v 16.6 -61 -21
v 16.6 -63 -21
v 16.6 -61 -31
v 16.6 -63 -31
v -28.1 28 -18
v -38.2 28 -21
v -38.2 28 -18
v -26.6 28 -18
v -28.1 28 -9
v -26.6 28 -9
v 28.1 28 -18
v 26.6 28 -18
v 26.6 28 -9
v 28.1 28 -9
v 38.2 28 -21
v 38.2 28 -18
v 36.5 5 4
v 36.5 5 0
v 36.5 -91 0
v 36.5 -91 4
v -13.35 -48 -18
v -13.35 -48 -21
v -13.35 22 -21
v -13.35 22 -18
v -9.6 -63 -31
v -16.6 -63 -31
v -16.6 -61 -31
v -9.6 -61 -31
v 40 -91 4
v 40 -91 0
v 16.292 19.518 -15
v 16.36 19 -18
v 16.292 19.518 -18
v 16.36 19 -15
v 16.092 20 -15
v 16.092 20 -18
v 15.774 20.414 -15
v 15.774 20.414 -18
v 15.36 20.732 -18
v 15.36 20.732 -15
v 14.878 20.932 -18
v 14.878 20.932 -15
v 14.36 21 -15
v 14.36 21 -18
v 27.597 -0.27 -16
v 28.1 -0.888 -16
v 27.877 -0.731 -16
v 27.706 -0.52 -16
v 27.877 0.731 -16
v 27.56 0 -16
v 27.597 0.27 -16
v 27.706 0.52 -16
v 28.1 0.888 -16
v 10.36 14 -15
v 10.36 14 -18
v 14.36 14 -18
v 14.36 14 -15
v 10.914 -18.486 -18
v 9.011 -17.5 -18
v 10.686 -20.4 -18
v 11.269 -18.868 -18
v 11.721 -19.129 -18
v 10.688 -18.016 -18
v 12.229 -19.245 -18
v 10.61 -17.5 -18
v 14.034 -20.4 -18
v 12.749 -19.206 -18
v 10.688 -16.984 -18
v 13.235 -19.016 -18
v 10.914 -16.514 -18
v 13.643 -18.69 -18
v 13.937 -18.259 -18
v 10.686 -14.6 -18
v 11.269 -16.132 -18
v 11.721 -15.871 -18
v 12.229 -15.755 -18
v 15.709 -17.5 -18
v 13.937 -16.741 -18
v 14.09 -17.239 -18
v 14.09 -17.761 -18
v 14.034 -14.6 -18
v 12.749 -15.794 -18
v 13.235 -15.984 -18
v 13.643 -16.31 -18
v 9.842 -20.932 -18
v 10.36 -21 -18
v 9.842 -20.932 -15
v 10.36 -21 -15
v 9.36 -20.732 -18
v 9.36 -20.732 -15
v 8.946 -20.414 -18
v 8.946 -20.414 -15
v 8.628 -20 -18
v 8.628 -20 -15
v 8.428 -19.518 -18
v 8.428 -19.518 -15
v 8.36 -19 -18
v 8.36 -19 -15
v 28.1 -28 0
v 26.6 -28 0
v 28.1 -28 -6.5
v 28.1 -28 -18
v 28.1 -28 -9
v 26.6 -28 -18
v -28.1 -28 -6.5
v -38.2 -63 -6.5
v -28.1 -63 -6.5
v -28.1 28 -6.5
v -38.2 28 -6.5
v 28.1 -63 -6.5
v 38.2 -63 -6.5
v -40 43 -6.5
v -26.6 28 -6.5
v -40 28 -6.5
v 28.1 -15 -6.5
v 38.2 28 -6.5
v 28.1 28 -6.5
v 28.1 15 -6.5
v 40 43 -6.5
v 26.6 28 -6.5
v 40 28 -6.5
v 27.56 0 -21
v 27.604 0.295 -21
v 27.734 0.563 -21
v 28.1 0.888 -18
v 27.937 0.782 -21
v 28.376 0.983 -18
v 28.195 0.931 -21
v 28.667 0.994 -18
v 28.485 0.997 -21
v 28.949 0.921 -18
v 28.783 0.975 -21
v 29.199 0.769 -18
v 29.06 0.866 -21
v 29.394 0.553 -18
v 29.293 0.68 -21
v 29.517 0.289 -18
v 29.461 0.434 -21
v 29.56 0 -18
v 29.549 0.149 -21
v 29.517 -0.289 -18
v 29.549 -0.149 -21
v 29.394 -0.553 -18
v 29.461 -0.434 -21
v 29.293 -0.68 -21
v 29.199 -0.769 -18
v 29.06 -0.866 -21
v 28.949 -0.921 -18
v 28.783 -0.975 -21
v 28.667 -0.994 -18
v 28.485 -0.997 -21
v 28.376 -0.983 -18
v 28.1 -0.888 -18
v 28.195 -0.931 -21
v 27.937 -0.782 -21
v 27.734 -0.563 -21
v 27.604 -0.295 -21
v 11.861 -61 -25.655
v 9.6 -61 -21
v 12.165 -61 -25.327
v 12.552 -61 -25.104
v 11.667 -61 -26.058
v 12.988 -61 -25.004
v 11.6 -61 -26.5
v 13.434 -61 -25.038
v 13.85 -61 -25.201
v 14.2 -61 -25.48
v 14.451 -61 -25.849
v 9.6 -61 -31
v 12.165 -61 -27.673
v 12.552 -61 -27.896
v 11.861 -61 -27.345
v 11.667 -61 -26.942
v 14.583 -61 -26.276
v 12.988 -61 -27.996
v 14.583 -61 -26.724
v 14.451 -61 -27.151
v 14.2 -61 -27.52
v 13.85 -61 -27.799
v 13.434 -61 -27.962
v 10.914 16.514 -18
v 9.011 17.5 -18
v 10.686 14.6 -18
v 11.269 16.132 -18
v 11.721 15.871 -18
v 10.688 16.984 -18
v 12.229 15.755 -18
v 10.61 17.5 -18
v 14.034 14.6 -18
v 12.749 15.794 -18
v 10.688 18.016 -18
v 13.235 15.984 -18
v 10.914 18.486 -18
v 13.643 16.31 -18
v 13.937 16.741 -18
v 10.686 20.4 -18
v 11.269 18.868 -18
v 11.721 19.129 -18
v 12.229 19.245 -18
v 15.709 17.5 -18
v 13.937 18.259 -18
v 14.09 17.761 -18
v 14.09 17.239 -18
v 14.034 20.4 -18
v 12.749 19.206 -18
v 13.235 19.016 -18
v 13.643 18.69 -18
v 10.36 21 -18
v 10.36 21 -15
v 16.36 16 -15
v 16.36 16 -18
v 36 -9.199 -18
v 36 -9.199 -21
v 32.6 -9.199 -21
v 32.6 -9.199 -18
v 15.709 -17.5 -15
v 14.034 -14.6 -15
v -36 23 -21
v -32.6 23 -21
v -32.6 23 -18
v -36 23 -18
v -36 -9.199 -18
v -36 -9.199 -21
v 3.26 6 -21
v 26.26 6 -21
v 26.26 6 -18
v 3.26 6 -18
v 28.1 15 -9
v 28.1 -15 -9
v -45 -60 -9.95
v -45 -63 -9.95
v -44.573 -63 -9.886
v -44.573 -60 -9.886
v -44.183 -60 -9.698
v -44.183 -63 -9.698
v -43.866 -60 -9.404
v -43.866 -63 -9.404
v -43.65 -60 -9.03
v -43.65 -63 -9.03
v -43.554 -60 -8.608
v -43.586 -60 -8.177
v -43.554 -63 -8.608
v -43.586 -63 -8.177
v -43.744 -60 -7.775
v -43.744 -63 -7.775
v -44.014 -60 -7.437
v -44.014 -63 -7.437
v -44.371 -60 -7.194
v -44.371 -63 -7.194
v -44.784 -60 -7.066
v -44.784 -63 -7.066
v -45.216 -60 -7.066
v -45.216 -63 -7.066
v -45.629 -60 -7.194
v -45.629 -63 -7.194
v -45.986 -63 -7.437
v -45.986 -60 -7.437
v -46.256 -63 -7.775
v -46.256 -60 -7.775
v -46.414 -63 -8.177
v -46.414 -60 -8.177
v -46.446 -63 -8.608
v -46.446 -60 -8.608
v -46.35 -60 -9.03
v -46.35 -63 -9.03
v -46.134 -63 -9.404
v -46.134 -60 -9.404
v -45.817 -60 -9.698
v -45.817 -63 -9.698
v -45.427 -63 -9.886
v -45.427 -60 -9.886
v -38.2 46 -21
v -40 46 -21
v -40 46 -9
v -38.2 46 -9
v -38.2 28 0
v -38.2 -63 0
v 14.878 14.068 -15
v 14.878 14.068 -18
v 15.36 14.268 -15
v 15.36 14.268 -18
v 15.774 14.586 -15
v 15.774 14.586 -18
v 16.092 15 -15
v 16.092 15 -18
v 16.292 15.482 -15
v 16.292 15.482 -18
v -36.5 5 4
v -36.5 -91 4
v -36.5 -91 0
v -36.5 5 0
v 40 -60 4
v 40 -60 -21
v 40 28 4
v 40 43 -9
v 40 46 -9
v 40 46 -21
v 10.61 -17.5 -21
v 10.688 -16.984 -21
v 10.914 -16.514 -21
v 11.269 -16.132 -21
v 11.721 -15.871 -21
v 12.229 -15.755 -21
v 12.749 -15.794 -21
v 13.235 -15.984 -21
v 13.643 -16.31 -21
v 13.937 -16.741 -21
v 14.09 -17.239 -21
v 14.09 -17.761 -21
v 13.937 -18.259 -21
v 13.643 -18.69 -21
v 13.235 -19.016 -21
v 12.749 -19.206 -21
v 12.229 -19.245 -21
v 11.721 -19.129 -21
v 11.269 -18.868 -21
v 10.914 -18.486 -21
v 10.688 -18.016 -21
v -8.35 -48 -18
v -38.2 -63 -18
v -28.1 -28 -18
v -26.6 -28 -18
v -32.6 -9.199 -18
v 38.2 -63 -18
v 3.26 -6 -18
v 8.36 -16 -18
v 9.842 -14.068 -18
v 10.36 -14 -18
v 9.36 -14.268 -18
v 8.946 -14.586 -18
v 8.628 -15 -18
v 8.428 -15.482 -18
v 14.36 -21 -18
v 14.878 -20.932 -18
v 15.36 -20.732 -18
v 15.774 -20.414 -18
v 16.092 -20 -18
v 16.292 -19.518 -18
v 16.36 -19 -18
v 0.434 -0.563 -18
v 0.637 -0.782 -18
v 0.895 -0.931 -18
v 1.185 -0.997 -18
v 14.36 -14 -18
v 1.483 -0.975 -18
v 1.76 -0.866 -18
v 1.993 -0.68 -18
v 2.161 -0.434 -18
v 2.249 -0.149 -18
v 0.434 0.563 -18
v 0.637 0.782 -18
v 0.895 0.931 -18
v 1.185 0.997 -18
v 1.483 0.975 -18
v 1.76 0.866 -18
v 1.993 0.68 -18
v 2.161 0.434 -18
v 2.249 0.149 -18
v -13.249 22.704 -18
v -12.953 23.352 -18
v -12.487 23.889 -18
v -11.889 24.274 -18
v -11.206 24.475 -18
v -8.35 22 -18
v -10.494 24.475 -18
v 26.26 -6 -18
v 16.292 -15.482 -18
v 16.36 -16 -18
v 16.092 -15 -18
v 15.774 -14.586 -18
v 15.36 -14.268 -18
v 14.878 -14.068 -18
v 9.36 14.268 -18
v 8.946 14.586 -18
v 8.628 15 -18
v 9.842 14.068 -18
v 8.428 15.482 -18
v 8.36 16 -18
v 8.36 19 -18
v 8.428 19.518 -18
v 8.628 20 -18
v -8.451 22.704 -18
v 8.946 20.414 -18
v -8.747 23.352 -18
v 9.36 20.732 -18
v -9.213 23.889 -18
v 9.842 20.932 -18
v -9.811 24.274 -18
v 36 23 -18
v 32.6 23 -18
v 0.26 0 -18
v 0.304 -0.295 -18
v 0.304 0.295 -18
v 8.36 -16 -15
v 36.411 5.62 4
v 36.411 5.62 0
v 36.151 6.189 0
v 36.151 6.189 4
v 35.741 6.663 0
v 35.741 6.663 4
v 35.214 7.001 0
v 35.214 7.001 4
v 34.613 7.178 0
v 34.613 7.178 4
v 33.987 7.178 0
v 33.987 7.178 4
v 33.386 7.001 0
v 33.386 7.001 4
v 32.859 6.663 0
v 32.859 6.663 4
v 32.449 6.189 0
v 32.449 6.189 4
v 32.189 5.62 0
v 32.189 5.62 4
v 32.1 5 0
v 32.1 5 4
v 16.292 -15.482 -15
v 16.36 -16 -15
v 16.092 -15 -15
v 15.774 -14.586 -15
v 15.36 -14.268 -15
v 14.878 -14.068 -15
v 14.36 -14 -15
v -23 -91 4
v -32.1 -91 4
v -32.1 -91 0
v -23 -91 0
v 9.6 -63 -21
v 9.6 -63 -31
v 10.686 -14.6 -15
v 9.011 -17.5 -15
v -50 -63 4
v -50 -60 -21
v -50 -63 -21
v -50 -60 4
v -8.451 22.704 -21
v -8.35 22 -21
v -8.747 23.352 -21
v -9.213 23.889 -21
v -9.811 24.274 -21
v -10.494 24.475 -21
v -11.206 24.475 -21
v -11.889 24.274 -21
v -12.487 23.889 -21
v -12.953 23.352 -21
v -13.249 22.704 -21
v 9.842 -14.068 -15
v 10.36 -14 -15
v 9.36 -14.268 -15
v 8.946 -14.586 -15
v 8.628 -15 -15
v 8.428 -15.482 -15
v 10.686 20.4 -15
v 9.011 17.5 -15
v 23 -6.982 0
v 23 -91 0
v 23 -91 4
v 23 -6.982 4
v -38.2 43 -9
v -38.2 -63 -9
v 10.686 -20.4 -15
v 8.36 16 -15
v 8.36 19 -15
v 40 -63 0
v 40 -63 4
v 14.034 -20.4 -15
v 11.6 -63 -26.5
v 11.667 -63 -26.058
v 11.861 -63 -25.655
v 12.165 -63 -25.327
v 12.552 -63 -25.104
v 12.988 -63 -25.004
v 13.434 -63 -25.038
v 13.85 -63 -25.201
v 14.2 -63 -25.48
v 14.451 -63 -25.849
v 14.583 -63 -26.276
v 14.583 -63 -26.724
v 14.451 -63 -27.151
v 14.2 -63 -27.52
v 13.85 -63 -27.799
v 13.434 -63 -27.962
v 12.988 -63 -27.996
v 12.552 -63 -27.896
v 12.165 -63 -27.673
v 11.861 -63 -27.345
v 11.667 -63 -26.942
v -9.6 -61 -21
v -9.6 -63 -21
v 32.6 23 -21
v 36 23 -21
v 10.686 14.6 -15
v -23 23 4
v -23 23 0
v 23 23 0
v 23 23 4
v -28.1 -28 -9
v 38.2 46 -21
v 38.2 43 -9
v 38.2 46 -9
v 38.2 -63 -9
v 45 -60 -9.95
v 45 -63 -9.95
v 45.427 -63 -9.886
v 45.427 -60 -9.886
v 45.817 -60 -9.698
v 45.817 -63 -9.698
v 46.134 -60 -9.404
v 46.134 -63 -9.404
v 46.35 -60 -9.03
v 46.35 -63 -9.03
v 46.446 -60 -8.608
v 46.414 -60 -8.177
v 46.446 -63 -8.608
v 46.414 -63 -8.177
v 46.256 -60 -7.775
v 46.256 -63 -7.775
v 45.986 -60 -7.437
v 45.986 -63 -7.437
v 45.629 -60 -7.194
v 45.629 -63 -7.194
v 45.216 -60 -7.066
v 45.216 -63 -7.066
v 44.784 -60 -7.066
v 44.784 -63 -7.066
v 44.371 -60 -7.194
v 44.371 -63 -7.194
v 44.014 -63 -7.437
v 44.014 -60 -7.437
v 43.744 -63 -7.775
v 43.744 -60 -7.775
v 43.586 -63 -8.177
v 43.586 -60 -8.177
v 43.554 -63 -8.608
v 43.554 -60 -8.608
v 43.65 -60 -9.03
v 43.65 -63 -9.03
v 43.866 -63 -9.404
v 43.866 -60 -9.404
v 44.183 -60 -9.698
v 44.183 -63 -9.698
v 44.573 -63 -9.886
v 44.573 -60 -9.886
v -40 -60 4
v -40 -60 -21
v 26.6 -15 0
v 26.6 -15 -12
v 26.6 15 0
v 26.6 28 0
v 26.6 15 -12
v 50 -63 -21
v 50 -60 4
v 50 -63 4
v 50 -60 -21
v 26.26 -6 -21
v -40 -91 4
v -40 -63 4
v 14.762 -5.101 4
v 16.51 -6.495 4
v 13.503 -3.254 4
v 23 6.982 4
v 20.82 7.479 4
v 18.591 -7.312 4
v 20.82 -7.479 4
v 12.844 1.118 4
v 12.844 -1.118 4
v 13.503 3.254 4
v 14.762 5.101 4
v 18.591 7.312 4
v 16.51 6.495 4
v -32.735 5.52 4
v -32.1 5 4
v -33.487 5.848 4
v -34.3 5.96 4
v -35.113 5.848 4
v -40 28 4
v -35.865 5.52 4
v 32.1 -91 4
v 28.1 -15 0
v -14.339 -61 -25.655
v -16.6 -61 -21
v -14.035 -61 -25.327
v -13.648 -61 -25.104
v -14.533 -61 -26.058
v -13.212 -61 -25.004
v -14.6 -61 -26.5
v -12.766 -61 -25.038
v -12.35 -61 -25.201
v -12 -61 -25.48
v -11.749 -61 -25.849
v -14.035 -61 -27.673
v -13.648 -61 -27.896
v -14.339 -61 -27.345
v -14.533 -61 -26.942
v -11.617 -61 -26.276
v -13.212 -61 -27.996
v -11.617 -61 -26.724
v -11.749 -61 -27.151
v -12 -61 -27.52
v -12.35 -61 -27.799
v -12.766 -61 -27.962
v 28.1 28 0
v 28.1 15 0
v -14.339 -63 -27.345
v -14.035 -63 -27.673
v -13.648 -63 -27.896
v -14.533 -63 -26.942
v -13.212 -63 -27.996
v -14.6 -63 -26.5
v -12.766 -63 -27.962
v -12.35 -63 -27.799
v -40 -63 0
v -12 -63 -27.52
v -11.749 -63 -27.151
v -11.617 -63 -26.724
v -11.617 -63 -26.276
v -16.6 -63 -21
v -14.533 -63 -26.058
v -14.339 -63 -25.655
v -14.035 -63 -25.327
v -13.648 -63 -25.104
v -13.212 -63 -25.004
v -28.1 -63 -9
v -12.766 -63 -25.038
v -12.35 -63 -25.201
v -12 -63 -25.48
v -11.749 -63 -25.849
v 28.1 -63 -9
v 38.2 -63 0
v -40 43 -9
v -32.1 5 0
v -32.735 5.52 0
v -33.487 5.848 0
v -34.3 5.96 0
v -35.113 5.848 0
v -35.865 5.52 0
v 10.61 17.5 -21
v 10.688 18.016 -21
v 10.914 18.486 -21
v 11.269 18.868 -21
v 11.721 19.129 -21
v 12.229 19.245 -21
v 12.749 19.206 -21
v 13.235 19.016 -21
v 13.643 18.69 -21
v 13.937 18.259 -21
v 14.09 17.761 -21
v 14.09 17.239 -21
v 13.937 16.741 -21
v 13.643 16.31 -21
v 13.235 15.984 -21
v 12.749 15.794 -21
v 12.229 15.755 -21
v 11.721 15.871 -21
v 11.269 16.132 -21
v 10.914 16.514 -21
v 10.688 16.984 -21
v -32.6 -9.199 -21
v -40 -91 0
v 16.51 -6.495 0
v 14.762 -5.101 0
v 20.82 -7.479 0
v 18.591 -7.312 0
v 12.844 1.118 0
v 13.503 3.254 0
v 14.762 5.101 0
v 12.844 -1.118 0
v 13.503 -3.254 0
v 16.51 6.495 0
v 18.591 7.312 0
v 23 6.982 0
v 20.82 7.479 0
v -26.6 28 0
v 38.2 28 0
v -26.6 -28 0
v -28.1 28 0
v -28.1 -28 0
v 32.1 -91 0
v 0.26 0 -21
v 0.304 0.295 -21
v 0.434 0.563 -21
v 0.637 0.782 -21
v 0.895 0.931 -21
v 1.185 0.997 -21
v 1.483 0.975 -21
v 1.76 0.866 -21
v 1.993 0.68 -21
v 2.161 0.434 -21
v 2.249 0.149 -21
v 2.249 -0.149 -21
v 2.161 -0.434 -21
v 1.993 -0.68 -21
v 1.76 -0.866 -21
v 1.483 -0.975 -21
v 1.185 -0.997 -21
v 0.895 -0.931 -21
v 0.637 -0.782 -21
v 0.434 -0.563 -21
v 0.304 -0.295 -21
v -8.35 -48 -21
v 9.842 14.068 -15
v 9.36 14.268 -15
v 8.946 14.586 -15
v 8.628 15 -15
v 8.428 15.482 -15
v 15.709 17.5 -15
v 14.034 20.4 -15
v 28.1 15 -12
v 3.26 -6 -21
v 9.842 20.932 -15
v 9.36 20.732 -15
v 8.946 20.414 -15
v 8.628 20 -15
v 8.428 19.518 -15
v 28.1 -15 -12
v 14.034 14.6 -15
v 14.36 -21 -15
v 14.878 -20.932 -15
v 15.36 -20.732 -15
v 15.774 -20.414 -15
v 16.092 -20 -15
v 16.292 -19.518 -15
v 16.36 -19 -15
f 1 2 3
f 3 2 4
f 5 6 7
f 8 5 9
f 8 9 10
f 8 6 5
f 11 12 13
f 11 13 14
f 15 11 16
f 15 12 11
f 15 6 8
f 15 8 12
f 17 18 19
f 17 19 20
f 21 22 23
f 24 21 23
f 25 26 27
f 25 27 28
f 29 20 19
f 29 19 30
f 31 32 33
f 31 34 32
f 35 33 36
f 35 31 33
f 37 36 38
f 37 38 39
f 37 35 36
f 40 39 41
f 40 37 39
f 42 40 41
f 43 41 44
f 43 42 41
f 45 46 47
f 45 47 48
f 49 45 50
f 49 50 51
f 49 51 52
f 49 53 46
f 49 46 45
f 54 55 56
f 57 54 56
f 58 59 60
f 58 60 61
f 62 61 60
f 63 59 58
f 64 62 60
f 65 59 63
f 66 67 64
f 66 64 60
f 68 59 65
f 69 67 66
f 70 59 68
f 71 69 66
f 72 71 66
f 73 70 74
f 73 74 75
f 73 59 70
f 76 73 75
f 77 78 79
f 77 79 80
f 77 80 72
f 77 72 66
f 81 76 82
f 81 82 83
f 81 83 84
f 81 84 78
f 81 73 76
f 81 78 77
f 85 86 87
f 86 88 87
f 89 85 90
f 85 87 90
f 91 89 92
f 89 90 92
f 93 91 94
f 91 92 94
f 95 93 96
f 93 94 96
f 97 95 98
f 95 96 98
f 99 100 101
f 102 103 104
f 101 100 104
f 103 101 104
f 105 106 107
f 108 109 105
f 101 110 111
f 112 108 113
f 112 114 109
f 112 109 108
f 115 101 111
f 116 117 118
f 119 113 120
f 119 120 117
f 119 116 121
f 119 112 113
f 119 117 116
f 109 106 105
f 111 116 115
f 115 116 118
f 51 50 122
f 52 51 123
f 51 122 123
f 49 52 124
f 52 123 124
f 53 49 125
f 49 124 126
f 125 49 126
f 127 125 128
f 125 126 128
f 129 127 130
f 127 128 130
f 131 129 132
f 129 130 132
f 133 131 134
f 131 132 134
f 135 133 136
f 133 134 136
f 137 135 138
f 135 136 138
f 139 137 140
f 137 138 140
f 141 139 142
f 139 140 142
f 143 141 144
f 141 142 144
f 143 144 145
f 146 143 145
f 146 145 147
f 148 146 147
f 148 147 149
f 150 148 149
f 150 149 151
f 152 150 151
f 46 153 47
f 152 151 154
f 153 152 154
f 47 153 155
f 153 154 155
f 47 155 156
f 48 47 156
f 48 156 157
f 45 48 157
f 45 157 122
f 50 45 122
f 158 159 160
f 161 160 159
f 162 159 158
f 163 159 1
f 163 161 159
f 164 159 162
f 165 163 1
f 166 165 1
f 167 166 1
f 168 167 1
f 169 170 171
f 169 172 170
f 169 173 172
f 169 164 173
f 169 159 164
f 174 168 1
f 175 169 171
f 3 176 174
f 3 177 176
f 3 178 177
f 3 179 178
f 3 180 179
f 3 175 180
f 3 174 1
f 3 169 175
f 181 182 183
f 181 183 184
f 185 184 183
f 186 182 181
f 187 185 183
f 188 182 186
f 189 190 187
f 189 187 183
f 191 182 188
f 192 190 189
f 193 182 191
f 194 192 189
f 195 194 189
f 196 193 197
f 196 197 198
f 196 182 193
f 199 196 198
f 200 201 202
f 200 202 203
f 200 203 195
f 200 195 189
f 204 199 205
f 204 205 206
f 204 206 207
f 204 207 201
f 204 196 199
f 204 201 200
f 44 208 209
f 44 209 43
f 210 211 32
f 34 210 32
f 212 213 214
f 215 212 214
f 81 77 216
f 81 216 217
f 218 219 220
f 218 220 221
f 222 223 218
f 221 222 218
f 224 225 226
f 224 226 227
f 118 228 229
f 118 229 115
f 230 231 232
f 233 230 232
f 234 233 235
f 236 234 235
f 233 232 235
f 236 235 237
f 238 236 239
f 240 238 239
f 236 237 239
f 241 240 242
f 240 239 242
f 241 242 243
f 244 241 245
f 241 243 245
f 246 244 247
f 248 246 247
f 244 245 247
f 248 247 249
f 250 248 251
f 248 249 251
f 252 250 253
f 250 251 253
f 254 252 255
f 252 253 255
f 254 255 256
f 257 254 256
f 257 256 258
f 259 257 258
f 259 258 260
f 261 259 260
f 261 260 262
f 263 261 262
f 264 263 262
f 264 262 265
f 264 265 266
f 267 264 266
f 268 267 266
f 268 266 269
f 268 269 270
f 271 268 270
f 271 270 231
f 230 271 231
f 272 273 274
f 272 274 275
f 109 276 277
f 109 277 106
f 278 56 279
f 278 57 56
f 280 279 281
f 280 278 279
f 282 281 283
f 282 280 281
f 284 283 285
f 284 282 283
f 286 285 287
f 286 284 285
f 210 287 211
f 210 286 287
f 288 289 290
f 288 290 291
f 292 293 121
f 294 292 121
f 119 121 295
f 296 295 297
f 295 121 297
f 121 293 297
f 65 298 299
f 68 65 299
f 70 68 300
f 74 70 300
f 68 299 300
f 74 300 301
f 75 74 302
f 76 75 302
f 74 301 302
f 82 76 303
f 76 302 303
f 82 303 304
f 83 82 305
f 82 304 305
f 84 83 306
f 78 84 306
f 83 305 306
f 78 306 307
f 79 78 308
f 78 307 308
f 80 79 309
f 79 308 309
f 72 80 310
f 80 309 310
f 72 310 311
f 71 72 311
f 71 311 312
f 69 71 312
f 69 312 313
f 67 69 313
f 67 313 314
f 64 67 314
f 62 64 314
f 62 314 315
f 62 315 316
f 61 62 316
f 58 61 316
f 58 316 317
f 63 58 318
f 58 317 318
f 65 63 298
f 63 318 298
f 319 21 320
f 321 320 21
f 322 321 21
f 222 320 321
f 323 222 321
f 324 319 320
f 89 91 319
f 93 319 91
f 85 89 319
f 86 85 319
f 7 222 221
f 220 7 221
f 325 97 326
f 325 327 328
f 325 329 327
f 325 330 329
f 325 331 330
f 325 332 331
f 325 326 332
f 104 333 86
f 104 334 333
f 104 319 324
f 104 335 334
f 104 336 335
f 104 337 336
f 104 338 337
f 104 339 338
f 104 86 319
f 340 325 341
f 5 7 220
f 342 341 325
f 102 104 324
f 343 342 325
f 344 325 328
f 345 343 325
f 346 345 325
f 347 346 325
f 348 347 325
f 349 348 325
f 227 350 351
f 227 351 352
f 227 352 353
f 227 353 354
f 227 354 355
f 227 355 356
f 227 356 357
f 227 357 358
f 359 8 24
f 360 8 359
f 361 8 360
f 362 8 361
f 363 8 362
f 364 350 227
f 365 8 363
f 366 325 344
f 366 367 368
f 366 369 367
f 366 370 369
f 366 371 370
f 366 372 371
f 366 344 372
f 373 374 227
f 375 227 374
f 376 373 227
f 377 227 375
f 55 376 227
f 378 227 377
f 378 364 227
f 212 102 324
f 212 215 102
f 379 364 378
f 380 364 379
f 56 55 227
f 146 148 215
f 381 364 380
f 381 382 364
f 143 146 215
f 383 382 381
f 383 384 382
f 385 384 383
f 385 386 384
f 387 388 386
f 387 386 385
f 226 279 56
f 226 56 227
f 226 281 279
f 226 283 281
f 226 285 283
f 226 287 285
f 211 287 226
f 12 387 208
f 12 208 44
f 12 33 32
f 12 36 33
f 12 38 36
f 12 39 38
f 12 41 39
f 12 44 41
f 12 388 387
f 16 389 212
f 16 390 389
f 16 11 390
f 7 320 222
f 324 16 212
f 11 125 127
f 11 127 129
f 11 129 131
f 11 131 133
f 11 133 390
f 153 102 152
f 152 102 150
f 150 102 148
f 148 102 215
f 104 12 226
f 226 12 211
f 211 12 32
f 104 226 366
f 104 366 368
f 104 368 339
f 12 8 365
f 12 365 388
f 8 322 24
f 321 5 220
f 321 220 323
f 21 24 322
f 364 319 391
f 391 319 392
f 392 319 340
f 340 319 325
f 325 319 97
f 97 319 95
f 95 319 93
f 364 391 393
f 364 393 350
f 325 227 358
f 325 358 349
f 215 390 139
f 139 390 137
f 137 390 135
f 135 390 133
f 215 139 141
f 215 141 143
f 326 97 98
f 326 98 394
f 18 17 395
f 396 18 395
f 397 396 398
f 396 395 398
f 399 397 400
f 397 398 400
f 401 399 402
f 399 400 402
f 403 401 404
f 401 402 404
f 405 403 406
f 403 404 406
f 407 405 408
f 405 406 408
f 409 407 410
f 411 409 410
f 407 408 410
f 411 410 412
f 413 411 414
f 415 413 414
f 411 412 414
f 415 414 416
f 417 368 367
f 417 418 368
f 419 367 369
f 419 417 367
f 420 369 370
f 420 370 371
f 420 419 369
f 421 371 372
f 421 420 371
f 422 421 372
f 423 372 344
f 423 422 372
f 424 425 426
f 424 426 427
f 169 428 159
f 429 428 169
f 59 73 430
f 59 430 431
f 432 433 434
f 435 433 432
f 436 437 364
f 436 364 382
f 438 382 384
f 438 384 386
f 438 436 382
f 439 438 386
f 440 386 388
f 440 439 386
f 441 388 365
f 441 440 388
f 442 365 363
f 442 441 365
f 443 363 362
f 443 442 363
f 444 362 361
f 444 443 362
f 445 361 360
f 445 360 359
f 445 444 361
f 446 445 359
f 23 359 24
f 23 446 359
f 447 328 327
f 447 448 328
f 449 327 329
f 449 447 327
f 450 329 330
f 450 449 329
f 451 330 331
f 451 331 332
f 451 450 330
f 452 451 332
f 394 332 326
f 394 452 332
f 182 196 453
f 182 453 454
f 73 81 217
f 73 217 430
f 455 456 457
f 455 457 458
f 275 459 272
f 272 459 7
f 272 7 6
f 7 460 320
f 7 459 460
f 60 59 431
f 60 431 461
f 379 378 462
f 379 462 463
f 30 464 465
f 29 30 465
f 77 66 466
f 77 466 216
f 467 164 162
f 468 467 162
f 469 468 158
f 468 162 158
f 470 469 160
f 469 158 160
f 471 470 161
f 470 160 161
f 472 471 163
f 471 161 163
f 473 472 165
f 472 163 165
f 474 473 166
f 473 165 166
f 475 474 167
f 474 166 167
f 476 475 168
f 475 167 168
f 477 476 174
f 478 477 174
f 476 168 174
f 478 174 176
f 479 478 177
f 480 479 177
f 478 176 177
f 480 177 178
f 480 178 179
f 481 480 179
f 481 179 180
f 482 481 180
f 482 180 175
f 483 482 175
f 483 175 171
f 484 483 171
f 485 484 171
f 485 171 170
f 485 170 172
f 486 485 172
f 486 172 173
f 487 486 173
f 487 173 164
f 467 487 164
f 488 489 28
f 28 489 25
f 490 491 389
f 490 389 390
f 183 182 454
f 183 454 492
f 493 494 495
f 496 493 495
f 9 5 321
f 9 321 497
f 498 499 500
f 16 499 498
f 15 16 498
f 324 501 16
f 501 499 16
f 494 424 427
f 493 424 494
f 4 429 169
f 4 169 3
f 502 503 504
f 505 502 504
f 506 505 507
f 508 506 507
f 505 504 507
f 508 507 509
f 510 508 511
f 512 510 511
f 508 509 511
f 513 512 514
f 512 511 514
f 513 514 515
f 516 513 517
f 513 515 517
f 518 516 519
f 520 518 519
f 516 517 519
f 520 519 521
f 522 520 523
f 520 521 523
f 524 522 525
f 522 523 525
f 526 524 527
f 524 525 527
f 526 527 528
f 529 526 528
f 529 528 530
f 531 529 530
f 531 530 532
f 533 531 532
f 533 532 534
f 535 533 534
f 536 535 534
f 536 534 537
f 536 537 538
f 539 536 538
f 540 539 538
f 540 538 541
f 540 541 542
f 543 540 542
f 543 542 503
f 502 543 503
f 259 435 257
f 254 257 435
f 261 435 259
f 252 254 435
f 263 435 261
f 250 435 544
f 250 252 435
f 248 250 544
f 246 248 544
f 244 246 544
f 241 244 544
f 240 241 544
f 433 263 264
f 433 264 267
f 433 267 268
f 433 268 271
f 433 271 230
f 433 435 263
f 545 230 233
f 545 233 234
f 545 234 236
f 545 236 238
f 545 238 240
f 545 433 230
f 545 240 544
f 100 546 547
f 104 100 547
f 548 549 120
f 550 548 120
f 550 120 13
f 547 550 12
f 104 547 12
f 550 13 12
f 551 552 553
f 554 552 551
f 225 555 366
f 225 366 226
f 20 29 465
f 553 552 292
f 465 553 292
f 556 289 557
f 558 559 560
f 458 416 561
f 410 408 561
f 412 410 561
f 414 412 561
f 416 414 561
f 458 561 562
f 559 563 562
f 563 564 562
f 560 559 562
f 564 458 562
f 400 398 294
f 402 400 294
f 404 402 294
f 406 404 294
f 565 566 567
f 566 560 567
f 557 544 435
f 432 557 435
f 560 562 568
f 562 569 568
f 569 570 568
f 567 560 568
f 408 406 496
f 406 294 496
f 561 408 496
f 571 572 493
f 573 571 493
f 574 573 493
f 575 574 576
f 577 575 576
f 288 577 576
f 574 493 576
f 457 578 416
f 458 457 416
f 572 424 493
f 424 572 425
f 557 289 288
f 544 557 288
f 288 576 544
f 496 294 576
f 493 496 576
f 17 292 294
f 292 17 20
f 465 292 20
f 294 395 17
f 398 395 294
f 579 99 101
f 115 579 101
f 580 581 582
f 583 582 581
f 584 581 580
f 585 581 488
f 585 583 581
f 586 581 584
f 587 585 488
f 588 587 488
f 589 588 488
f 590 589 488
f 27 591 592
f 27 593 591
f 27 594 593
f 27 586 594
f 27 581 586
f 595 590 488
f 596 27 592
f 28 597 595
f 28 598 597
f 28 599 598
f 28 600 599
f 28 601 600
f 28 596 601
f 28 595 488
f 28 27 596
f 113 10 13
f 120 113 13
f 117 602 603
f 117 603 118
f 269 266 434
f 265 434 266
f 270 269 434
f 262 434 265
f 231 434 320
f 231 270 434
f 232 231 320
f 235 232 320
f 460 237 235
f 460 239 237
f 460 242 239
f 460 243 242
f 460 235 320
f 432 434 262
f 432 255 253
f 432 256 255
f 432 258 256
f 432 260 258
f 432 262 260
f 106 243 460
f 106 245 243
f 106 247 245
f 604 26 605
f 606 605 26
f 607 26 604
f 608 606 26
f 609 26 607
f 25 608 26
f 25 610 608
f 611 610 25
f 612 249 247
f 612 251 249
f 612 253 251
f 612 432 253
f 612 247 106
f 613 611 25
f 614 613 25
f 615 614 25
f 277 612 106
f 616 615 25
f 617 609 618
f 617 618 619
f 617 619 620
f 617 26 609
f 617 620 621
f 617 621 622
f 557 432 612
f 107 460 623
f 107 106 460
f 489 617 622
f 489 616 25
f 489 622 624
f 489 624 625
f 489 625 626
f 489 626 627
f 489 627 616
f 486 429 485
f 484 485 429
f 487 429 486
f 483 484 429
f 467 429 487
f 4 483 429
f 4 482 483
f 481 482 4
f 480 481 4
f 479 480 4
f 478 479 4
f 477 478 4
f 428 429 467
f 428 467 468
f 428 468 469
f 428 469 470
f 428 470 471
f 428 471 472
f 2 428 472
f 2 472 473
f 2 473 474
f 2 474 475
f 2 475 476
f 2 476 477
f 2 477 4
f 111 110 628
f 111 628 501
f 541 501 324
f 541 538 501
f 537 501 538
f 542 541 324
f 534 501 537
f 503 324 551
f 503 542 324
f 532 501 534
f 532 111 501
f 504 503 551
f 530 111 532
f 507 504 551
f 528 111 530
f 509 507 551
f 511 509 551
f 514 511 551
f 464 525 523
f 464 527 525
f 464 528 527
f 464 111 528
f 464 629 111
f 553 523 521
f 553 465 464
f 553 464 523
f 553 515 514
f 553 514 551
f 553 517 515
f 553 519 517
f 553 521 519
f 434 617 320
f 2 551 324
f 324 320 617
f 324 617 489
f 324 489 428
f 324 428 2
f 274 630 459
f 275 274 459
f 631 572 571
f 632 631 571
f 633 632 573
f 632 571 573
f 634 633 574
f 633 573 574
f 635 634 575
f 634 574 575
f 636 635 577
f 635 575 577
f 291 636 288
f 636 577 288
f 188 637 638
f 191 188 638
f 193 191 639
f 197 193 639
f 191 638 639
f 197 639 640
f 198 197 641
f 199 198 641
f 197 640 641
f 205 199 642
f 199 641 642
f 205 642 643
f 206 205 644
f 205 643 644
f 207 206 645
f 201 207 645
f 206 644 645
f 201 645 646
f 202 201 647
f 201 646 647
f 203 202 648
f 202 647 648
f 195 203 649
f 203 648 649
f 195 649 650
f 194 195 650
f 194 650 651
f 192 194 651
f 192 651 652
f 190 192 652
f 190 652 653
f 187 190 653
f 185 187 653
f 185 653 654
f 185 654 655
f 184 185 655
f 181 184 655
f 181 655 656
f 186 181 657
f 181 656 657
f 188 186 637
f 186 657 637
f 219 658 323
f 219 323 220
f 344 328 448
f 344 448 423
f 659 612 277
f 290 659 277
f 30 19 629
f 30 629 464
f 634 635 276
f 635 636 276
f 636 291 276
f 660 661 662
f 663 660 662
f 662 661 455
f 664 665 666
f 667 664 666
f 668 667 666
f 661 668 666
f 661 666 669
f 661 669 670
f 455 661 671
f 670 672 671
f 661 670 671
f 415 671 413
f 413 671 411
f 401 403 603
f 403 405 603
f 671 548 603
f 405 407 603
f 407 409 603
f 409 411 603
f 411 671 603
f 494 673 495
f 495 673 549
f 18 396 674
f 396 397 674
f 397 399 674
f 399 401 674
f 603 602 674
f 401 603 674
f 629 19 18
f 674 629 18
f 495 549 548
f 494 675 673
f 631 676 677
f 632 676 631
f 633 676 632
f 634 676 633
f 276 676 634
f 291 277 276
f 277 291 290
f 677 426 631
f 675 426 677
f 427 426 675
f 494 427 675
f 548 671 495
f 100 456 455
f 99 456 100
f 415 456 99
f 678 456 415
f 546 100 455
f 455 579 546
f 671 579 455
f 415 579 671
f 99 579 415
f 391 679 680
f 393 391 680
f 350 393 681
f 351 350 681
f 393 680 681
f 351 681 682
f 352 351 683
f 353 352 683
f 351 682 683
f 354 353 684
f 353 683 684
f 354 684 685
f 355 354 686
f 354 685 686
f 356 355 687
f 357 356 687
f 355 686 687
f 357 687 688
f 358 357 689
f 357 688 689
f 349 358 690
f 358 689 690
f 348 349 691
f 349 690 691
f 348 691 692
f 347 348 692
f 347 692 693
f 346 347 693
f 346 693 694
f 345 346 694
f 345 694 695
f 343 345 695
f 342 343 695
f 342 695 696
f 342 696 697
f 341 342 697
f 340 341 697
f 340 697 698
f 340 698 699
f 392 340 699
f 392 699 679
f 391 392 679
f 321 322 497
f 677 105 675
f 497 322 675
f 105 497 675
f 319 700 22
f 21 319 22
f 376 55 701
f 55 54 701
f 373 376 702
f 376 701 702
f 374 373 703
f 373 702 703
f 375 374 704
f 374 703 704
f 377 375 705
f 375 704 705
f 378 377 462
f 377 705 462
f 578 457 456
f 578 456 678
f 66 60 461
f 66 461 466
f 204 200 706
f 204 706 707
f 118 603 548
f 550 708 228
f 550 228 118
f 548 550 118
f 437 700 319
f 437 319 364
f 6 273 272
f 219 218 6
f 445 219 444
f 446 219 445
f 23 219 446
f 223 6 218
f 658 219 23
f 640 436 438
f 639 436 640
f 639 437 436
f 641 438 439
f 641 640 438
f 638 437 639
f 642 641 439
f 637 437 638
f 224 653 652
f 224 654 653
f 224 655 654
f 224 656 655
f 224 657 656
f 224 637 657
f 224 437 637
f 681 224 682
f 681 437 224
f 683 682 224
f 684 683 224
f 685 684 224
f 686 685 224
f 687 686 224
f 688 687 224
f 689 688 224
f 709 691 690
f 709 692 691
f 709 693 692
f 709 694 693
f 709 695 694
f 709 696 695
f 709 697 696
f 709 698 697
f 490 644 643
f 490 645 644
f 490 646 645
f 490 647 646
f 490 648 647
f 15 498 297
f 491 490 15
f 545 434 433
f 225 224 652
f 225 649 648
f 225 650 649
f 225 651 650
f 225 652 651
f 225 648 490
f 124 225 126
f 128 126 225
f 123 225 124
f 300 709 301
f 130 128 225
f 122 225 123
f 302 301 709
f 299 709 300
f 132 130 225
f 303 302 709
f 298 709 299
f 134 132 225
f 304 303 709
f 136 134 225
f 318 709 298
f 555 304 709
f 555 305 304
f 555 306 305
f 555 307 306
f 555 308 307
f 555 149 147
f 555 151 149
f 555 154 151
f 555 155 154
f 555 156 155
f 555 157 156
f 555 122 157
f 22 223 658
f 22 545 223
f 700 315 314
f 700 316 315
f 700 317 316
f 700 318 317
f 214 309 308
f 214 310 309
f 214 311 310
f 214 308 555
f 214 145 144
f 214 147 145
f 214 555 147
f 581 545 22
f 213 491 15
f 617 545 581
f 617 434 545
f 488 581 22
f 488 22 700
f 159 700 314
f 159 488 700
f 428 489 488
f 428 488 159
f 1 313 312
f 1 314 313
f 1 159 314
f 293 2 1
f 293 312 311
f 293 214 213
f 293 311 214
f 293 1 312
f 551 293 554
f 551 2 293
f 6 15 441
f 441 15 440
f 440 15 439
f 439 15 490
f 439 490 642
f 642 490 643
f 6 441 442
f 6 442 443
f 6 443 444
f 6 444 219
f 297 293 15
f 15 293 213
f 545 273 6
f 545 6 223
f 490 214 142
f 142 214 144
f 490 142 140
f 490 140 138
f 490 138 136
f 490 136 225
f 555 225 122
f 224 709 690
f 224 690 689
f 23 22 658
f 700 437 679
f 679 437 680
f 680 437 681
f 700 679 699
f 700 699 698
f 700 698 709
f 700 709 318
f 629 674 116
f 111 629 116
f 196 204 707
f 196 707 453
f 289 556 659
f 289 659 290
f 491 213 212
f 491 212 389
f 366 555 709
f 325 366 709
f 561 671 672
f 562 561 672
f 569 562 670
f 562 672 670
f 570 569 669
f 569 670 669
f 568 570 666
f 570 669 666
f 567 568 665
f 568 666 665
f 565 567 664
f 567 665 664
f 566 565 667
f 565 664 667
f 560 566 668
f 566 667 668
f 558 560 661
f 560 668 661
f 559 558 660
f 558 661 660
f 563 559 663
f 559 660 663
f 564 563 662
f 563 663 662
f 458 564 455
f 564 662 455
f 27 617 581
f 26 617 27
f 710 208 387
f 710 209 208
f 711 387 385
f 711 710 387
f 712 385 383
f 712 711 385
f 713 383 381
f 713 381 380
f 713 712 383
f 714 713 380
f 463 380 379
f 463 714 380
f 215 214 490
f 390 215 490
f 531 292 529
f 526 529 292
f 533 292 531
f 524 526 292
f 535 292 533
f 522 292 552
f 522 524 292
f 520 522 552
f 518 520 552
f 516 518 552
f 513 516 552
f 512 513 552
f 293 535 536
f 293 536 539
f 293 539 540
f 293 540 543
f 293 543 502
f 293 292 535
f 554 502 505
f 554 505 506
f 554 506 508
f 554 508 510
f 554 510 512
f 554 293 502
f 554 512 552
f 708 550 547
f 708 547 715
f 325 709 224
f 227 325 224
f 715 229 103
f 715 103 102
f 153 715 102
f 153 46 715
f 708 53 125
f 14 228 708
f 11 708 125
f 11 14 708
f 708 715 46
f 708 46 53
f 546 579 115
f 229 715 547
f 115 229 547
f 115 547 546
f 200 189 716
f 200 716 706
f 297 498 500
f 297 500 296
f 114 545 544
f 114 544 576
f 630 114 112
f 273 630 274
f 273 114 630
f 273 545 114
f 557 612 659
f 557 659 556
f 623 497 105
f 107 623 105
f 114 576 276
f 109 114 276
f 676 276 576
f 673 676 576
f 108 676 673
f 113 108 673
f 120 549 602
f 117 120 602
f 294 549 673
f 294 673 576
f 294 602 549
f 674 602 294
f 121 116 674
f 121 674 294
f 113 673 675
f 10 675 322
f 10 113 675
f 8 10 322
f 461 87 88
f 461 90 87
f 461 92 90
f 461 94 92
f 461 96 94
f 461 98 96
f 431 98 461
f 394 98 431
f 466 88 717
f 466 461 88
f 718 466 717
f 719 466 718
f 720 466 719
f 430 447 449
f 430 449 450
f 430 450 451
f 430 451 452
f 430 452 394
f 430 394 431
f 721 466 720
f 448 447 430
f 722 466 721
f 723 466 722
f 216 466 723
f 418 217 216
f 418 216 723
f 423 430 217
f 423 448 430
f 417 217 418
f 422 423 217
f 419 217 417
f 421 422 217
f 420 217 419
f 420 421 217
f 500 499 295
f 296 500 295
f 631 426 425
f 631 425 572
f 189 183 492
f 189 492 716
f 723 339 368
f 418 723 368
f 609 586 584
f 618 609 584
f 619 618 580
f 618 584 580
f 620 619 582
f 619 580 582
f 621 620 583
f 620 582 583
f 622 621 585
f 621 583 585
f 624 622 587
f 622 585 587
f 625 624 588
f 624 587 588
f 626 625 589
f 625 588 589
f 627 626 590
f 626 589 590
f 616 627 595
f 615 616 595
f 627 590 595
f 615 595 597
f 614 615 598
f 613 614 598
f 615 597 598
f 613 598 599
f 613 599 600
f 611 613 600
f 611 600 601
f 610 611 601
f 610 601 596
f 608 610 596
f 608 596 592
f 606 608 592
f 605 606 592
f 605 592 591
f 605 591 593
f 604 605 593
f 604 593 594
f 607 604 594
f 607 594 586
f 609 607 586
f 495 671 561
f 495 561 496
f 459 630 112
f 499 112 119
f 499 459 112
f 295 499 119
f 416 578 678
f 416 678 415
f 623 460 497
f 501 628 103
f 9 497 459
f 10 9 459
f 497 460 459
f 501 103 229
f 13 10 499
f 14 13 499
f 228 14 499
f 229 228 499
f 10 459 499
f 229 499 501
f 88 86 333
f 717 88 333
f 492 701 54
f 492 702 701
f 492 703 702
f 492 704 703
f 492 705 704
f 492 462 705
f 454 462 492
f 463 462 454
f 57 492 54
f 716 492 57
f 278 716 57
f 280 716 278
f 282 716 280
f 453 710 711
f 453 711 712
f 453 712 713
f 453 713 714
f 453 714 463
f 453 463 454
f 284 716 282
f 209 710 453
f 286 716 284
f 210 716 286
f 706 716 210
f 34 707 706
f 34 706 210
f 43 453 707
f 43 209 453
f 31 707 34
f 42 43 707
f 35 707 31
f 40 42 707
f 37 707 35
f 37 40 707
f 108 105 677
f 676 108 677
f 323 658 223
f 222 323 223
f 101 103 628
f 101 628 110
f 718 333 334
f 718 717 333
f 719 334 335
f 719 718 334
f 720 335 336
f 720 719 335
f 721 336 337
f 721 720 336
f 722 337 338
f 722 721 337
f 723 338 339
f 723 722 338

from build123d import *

# Parameters (mm, degrees)
SKETCH1_W            = 9.1
SKETCH1_H            = 51
SKETCH1_W_2          = 23
SKETCH1_H_2          = 5
BOSS_EXTRUDE1_DEPTH  = 4
SKETCH2_W            = 1.8
SKETCH2_H            = 56
SKETCH2_W_2          = 1.5
BOSS_EXTRUDE2_DEPTH  = 5
SKETCH3_W            = 1.5
SKETCH3_H            = 30
CUT_EXTRUDE1_DEPTH   = 5
SKETCH4_W            = 1.8
SKETCH4_H            = 13
SKETCH4_W_2          = 1.5
SKETCH4_H_2          = 3
SKETCH4_W_3          = 10.1
SKETCH4_W_4          = 53.2
BOSS_EXTRUDE3_DEPTH  = 56
SKETCH5_R            = 1.75
SKETCH5_R_2          = 4.75
CUT_EXTRUDE2_DEPTH   = 3
SKETCH6_W            = 8
SKETCH6_H            = 7
BOSS_EXTRUDE4_DEPTH  = 3
FILLET1_R            = 2
SKETCH7_W            = 1.5
SKETCH7_H            = 30
CUT_EXTRUDE3_DEPTH   = 7
SKETCH8_W            = 5
SKETCH8_H            = 50
CUT_EXTRUDE4_DEPTH   = 3
SKETCH11_W           = 7
SKETCH11_H           = 3
BOSS_EXTRUDE5_DEPTH  = 10
SKETCH12_W           = 25
SKETCH12_H           = 3
BOSS_EXTRUDE6_DEPTH  = 10
SKETCH13_W           = 25
SKETCH13_H           = 3
BOSS_EXTRUDE7_DEPTH  = 10
SKETCH14_R           = 1.75
CUT_EXTRUDE6_DEPTH   = 3
BOSS_EXTRUDE8_START  = -4
BOSS_EXTRUDE8_DEPTH  = 4
SKETCH17_W           = 3.4
SKETCH17_H           = 32.199052503
CUT_EXTRUDE8_DEPTH   = 4
SKETCH18_W           = 23
SKETCH18_H           = 12
CUT_EXTRUDE9_DEPTH   = 10
SKETCH19_W           = 76.4
SKETCH19_H           = 18
BOSS_EXTRUDE10_DEPTH = 35
SKETCH21_R           = 1.45
CUT_EXTRUDE11_DEPTH  = 109.360509412
SKETCH20_W           = 10
SKETCH20_H           = 25
SKETCH20_W_2         = 7
SKETCH20_H_2         = 10
CUT_EXTRUDE10_DEPTH  = 35
SKETCH22_W           = 4.4
SKETCH22_H           = 35
CUT_EXTRUDE12_DEPTH  = 10
SKETCH23_W           = 46
SKETCH23_H           = 35
CUT_EXTRUDE13_DEPTH  = 10
SKETCH25_W           = 1.8
SKETCH25_H           = 12
BOSS_EXTRUDE12_DEPTH = 18
SKETCH27_R           = 1
CUT_EXTRUDE15_DEPTH  = 5
SKETCH28_W           = 7
SKETCH28_H           = 10
CUT_EXTRUDE16_DEPTH  = 122.231184107
SKETCH29_W           = 7
SKETCH29_H           = 10
BOSS_EXTRUDE13_DEPTH = 2
SKETCH30_R           = 1.5
CUT_EXTRUDE17_DEPTH  = 109.360509412
BOSS_EXTRUDE14_DEPTH = 4
SKETCH33_W           = 3.5
SKETCH33_H           = 4
SKETCH33_W_2         = 9.1
BOSS_EXTRUDE15_DEPTH = 28
BOSS_EXTRUDE16_DEPTH = 4
SKETCH35_W           = 80
SKETCH35_H           = 15
BOSS_EXTRUDE17_DEPTH = 2.5
SKETCH36_W           = 10.1
SKETCH36_H           = 2.5
BOSS_EXTRUDE18_DEPTH = 91
SKETCH37_W           = 5
SKETCH37_H           = 20
CUT_EXTRUDE18_DEPTH  = 5


with BuildPart() as part:
    # Sketch1 → Boss-Extrude1 (new body)
    with BuildSketch(Plane.XY):
        with BuildLine():
            Line((-23, 23), (-23, 28))
            Line((-23, 28), (-40, 28))
            Line((-40, 28), (-40, -28))
            Line((-40, -28), (-36.5, -28))
            Line((-36.5, -28), (-36.5, 23))
            ThreePointArc((-36.5, 23), (-34.3, 25.2), (-32.1, 23))
            Line((-32.1, 23), (-23, 23))
        make_face()
        with Locations((-27.55, -2.5)):
            Rectangle(SKETCH1_W, SKETCH1_H)
        with Locations((-11.5, 25.5)):
            Rectangle(SKETCH1_W_2, SKETCH1_H_2)
        with Locations((27.55, -2.5)):
            Rectangle(SKETCH1_W, SKETCH1_H)
        with Locations((11.5, 25.5)):
            Rectangle(SKETCH1_W_2, SKETCH1_H_2)
        with BuildLine():
            Line((40, 28), (23, 28))
            Line((23, 28), (23, 23))
            Line((23, 23), (32.1, 23))
            ThreePointArc((32.1, 23), (34.3, 25.2), (36.5, 23))
            Line((36.5, 23), (36.5, -28))
            Line((36.5, -28), (40, -28))
            Line((40, -28), (40, 28))
        make_face()
    extrude(amount=BOSS_EXTRUDE1_DEPTH)

    # Sketch2 → Boss-Extrude2 (add)
    with BuildSketch(Plane(origin=(0, 0, 0), x_dir=(-1, 0, 0), z_dir=(0, 0, -1))):
        with Locations((-39.1, 0)):
            Rectangle(SKETCH2_W, SKETCH2_H)
        with Locations((-27.35, 0)):
            Rectangle(SKETCH2_W_2, SKETCH2_H)
        with Locations((27.35, 0)):
            Rectangle(SKETCH2_W_2, SKETCH2_H)
        with Locations((39.1, 0)):
            Rectangle(SKETCH2_W, SKETCH2_H)
    extrude(amount=BOSS_EXTRUDE2_DEPTH)

    # Sketch3 → Cut-Extrude1 (cut)
    with BuildSketch(Plane(origin=(0, 0, -5), x_dir=(-1, 0, 0), z_dir=(0, 0, -1))):
        with Locations((-27.35, 0)):
            Rectangle(SKETCH3_W, SKETCH3_H)
    extrude(amount=-CUT_EXTRUDE1_DEPTH, mode=Mode.SUBTRACT)

    # Sketch4 → Boss-Extrude3 (add)
    with BuildSketch(Plane(origin=(0, 28, 0), x_dir=(1, 0, 0), z_dir=(0, 1, 0))):
        with Locations((-39.1, 11.5)):
            Rectangle(SKETCH4_W, SKETCH4_H)
        with Locations((-27.35, 11.5)):
            Rectangle(SKETCH4_W_2, SKETCH4_H)
        with Locations((-27.35, 19.5)):
            Rectangle(SKETCH4_W_2, SKETCH4_H_2)
        with Locations((-33.15, 19.5)):
            Rectangle(SKETCH4_W_3, SKETCH4_H_2)
        with Locations((-39.1, 19.5)):
            Rectangle(SKETCH4_W, SKETCH4_H_2)
        with Locations((0, 19.5)):
            Rectangle(SKETCH4_W_4, SKETCH4_H_2)
        with Locations((27.35, 11.5)):
            Rectangle(SKETCH4_W_2, SKETCH4_H)
        with Locations((27.35, 19.5)):
            Rectangle(SKETCH4_W_2, SKETCH4_H_2)
        with Locations((33.15, 19.5)):
            Rectangle(SKETCH4_W_3, SKETCH4_H_2)
        with Locations((39.1, 19.5)):
            Rectangle(SKETCH4_W, SKETCH4_H_2)
        with Locations((39.1, 11.5)):
            Rectangle(SKETCH4_W, SKETCH4_H)
    extrude(amount=-BOSS_EXTRUDE3_DEPTH)

    # Sketch5 → Cut-Extrude2 (cut)
    with BuildSketch(Plane(origin=(0, 0, -21), x_dir=(-1, 0, 0), z_dir=(0, 0, -1))):
        with Locations((-12.36, 17.5)):
            Circle(SKETCH5_R)
        with Locations((-12.36, -17.5)):
            Circle(SKETCH5_R)
        with Locations((-20.26, 0)):
            Circle(SKETCH5_R_2)
    extrude(amount=-CUT_EXTRUDE2_DEPTH, mode=Mode.SUBTRACT)

    # Sketch6 → Boss-Extrude4 (add)
    # profile 1 of 2: a face of its own
    with BuildSketch(Plane.XY.offset(-18)):
        with Locations((12.36, 17.5)):
            Rectangle(SKETCH6_W, SKETCH6_H)
        Polygon((10.685684219, 14.6), (14.034315781, 14.6), (15.708631561, 17.5), (14.034315781, 20.4), (10.685684219, 20.4), (9.011368439, 17.5), align=None, mode=Mode.SUBTRACT)
    # profile 2 of 2: a face of its own
    with BuildSketch(Plane.XY.offset(-18)):
        with Locations((12.36, -17.5)):
            Rectangle(SKETCH6_W, SKETCH6_H)
        Polygon((10.685684219, -20.4), (14.034315781, -20.4), (15.708631561, -17.5), (14.034315781, -14.6), (10.685684219, -14.6), (9.011368439, -17.5), align=None, mode=Mode.SUBTRACT)
    extrude(amount=BOSS_EXTRUDE4_DEPTH)

    # Fillet1
    fillet1_edges = [part.edges().sort_by_distance(p)[0] for p in [
        (16.36, 14, -16.5),
        (16.36, 21, -16.5),
        (8.36, 21, -16.5),
        (8.36, 14, -16.5),
        (16.36, -21, -16.5),
        (16.36, -14, -16.5),
        (8.36, -14, -16.5),
        (8.36, -21, -16.5),
    ]]
    fillet(fillet1_edges, radius=FILLET1_R)

    # Sketch7 → Cut-Extrude3 (cut)
    with BuildSketch(Plane.XY.offset(-5)):
        with Locations((27.35, 0)):
            Rectangle(SKETCH7_W, SKETCH7_H)
    extrude(amount=-CUT_EXTRUDE3_DEPTH, mode=Mode.SUBTRACT)

    # Sketch8 → Cut-Extrude4 (cut)
    with BuildSketch(Plane(origin=(0, 0, -21), x_dir=(-1, 0, 0), z_dir=(0, 0, -1))):
        with Locations((10.85, -3)):
            Rectangle(SKETCH8_W, SKETCH8_H)
        with BuildLine():
            ThreePointArc((8.35, 22), (10.85, 24.5), (13.35, 22))
            Line((13.35, 22), (8.35, 22))
        make_face()
    extrude(amount=-CUT_EXTRUDE4_DEPTH, mode=Mode.SUBTRACT)

    # Sketch11 → Boss-Extrude5 (add)
    with BuildSketch(Plane(origin=(0, 0, -21), x_dir=(-1, 0, 0), z_dir=(0, 0, -1))):
        with Locations((-20.5, -26.5)):
            Rectangle(SKETCH11_W, SKETCH11_H)
        with Locations((20.5, -26.5)):
            Rectangle(SKETCH11_W, SKETCH11_H)
    extrude(amount=BOSS_EXTRUDE5_DEPTH)

    # Sketch12 → Boss-Extrude6 (add)
    with BuildSketch(Plane(origin=(40, 0, 0), x_dir=(0, 0, -1), z_dir=(1, 0, 0))):
        with Locations((8.5, -26.5)):
            Rectangle(SKETCH12_W, SKETCH12_H)
    extrude(amount=BOSS_EXTRUDE6_DEPTH)

    # Sketch13 → Boss-Extrude7 (add)
    with BuildSketch(Plane.ZY.offset(40)):
        with Locations((-8.5, -26.5)):
            Rectangle(SKETCH13_W, SKETCH13_H)
    extrude(amount=BOSS_EXTRUDE7_DEPTH)

    # Sketch14 → Cut-Extrude6 (cut)
    with BuildSketch(Plane(origin=(0, -25, 0), x_dir=(1, 0, 0), z_dir=(0, 1, 0))):
        with Locations(Location((20.5, 26, 0), (0, 0, 180))):
            Circle(SKETCH14_R)
        with Locations(Location((45, 8.5, 0), (0, 0, 180))):
            Circle(SKETCH14_R)
        with Locations(Location((-20.5, 26, 0), (0, 0, 180))):
            Circle(SKETCH14_R)
        with Locations(Location((-45, 8.5, 0), (0, 0, 180))):
            Circle(SKETCH14_R)
    extrude(amount=-CUT_EXTRUDE6_DEPTH, mode=Mode.SUBTRACT)

    # Sketch15 → Boss-Extrude8 (add)
    with BuildSketch(Plane.XY.offset(4).offset(BOSS_EXTRUDE8_START)):
        with BuildLine():
            ThreePointArc((23, 3.880064432), (24.477671158, 2.184891302), (25.01, 0))
            ThreePointArc((25.01, 0), (24.477671158, -2.184891302), (23, -3.880064432))
            Line((23, -3.880064432), (23, -6.981575753))
            ThreePointArc((23, -6.981575753), (26.456773354, -4.224926035), (27.76, 0))
            ThreePointArc((27.76, 0), (26.456773354, 4.224926035), (23, 6.981575753))
            Line((23, 6.981575753), (23, 3.880064432))
        make_face()
        with BuildLine():
            ThreePointArc((23, -3.880064432), (15.51, 0), (23, 3.880064432))
            Line((23, 3.880064432), (23, 6.981575753))
            ThreePointArc((23, 6.981575753), (12.76, 0), (23, -6.981575753))
            Line((23, -6.981575753), (23, -3.880064432))
        make_face()
        with BuildLine():
            ThreePointArc((23, -3.880064432), (24.477671158, -2.184891302), (25.01, 0))
            ThreePointArc((25.01, 0), (24.477671158, 2.184891302), (23, 3.880064432))
            Line((23, 3.880064432), (23, -3.880064432))
        make_face()
        with BuildLine():
            Line((23, -3.880064432), (23, 3.880064432))
            ThreePointArc((23, 3.880064432), (15.51, 0), (23, -3.880064432))
        make_face()
    extrude(amount=BOSS_EXTRUDE8_DEPTH)

    # Sketch17 → Cut-Extrude8 (cut)
    with BuildSketch(Plane(origin=(0, 0, -21), x_dir=(-1, 0, 0), z_dir=(0, 0, -1))):
        with Locations((34.3, 6.900473748)):
            Rectangle(SKETCH17_W, SKETCH17_H)
        with Locations((-34.3, 6.900473748)):
            Rectangle(SKETCH17_W, SKETCH17_H)
    extrude(amount=-CUT_EXTRUDE8_DEPTH, mode=Mode.SUBTRACT)

    # Sketch18 → Cut-Extrude9 (cut)
    with BuildSketch(Plane(origin=(0, 0, -21), x_dir=(-1, 0, 0), z_dir=(0, 0, -1))):
        with Locations((-14.76, 0)):
            Rectangle(SKETCH18_W, SKETCH18_H)
    extrude(amount=-CUT_EXTRUDE9_DEPTH, mode=Mode.SUBTRACT)

    # Sketch19 → Boss-Extrude10 (add)
    with BuildSketch(Plane.XZ.offset(28)):
        Polygon((-50, 4), (-38.2, 4), (38.2, 4), (50, 4), (50, -21), (38.2, -21), (24, -21), (24, -31), (17, -31), (17, -21), (-17, -21), (-17, -31), (-24, -31), (-24, -21), (-38.2, -21), (-50, -21), align=None)
        with Locations((0, -9)):
            Rectangle(SKETCH19_W, SKETCH19_H, mode=Mode.SUBTRACT)
    extrude(amount=BOSS_EXTRUDE10_DEPTH)

    # Sketch21 → Cut-Extrude11 (cut, through all)
    with BuildSketch(Plane.XZ.offset(63)):
        with Locations(Location((45, -8.5, 0), (0, 0, 270))):
            Circle(SKETCH21_R)
        with Locations(Location((20.5, -26, 0), (0, 0, 270))):
            Circle(SKETCH21_R)
        with Locations(Location((-20.5, -26, 0), (0, 0, 270))):
            Circle(SKETCH21_R)
        with Locations(Location((-45, -8.5, 0), (0, 0, 270))):
            Circle(SKETCH21_R)
    extrude(amount=-CUT_EXTRUDE11_DEPTH, mode=Mode.SUBTRACT)

    # Sketch20 → Cut-Extrude10 (cut)
    with BuildSketch(Plane(origin=(0, -25, 0), x_dir=(1, 0, 0), z_dir=(0, 1, 0))):
        with Locations((-45, 8.5)):
            Rectangle(SKETCH20_W, SKETCH20_H)
        with Locations((45, 8.5)):
            Rectangle(SKETCH20_W, SKETCH20_H)
        with Locations((-20.5, 26)):
            Rectangle(SKETCH20_W_2, SKETCH20_H_2)
        with Locations((20.5, 26)):
            Rectangle(SKETCH20_W_2, SKETCH20_H_2)
    extrude(amount=-CUT_EXTRUDE10_DEPTH, mode=Mode.SUBTRACT)

    # Sketch22 → Cut-Extrude12 (cut)
    with BuildSketch(Plane.XY.offset(4)):
        with Locations((-34.3, -45.5)):
            Rectangle(SKETCH22_W, SKETCH22_H)
        with Locations((34.3, -45.5)):
            Rectangle(SKETCH22_W, SKETCH22_H)
    extrude(amount=-CUT_EXTRUDE12_DEPTH, mode=Mode.SUBTRACT)

    # Sketch23 → Cut-Extrude13 (cut)
    with BuildSketch(Plane.XY.offset(4)):
        with Locations((0, -45.5)):
            Rectangle(SKETCH23_W, SKETCH23_H)
    extrude(amount=-CUT_EXTRUDE13_DEPTH, mode=Mode.SUBTRACT)

    # Sketch25 → Boss-Extrude12 (add)
    with BuildSketch(Plane(origin=(0, 28, 0), x_dir=(1, 0, 0), z_dir=(0, 1, 0))):
        with Locations((39.1, 15)):
            Rectangle(SKETCH25_W, SKETCH25_H)
        with Locations((-39.1, 15)):
            Rectangle(SKETCH25_W, SKETCH25_H)
    extrude(amount=BOSS_EXTRUDE12_DEPTH)

    # Sketch27 → Cut-Extrude15 (cut)
    with BuildSketch(Plane(origin=(0, 0, -21), x_dir=(-1, 0, 0), z_dir=(0, 0, -1))):
        with Locations((-1.26, 0)):
            Circle(SKETCH27_R)
        with Locations((-28.56, 0)):
            Circle(SKETCH27_R)
    extrude(amount=-CUT_EXTRUDE15_DEPTH, mode=Mode.SUBTRACT)

    # Sketch28 → Cut-Extrude16 (cut, through all)
    with BuildSketch(Plane(origin=(0, -60, 0), x_dir=(1, 0, 0), z_dir=(0, 1, 0))):
        with Locations((20.5, 26)):
            Rectangle(SKETCH28_W, SKETCH28_H)
        with Locations((-20.5, 26)):
            Rectangle(SKETCH28_W, SKETCH28_H)
    extrude(amount=-CUT_EXTRUDE16_DEPTH, mode=Mode.SUBTRACT)

    # Sketch29 → Boss-Extrude13 (add)
    with BuildSketch(Plane(origin=(0, -63, 0), x_dir=(1, 0, 0), z_dir=(0, 1, 0))):
        with Locations((13.1, 26)):
            Rectangle(SKETCH29_W, SKETCH29_H)
        with Locations((-13.1, 26)):
            Rectangle(SKETCH29_W, SKETCH29_H)
    extrude(amount=BOSS_EXTRUDE13_DEPTH)

    # Sketch30 → Cut-Extrude17 (cut, through all)
    with BuildSketch(Plane(origin=(0, 28, 0), x_dir=(1, 0, 0), z_dir=(0, 1, 0))):
        with Locations(Location((13.1, 26.5, 0), (0, 0, 180))):
            Circle(SKETCH30_R)
        with Locations(Location((-13.1, 26.5, 0), (0, 0, 180))):
            Circle(SKETCH30_R)
    extrude(amount=-CUT_EXTRUDE17_DEPTH, mode=Mode.SUBTRACT)

    # Sketch32 → Boss-Extrude14 (add)
    with BuildSketch(Plane.XY.offset(4)):
        with BuildLine():
            Line((-38, 26), (-30, 26))
            Line((-30, 26), (-30, 5))
            Line((-30, 5), (-32.1, 5))
            ThreePointArc((-32.1, 5), (-34.3, 5.960392195), (-36.5, 5))
            Line((-36.5, 5), (-38, 5))
            Line((-38, 5), (-38, 26))
        make_face()
    extrude(amount=-BOSS_EXTRUDE14_DEPTH)

    # Sketch33 → Boss-Extrude15 (add)
    with BuildSketch(Plane.XZ.offset(63)):
        with Locations((38.25, 2)):
            Rectangle(SKETCH33_W, SKETCH33_H)
        with Locations((-38.25, 2)):
            Rectangle(SKETCH33_W, SKETCH33_H)
        with Locations((-27.55, 2)):
            Rectangle(SKETCH33_W_2, SKETCH33_H)
        with Locations((27.55, 2)):
            Rectangle(SKETCH33_W_2, SKETCH33_H)
    extrude(amount=BOSS_EXTRUDE15_DEPTH)

    # Sketch34 → Boss-Extrude16 (add)
    with BuildSketch(Plane.XY.offset(4)):
        with BuildLine():
            Line((30, 26), (38, 26))
            Line((38, 26), (38, 5))
            Line((38, 5), (36.5, 5))
            ThreePointArc((36.5, 5), (34.3, 7.2), (32.1, 5))
            Line((32.1, 5), (30, 5))
            Line((30, 5), (30, 26))
        make_face()
    extrude(amount=-BOSS_EXTRUDE16_DEPTH)

    # Sketch35 → Boss-Extrude17 (add)
    with BuildSketch(Plane.XY.offset(-9)):
        with Locations((0, 35.5)):
            Rectangle(SKETCH35_W, SKETCH35_H)
    extrude(amount=BOSS_EXTRUDE17_DEPTH)

    # Sketch36 → Boss-Extrude18 (add)
    with BuildSketch(Plane.XZ.offset(-28)):
        with Locations((-33.15, -7.75)):
            Rectangle(SKETCH36_W, SKETCH36_H)
        with Locations((33.15, -7.75)):
            Rectangle(SKETCH36_W, SKETCH36_H)
    extrude(amount=BOSS_EXTRUDE18_DEPTH)

    # Sketch37 → Cut-Extrude18 (cut)
    with BuildSketch(Plane(origin=(0, 0, -21), x_dir=(-1, 0, 0), z_dir=(0, 0, -1))):
        with Locations((10.85, -38)):
            Rectangle(SKETCH37_W, SKETCH37_H)
    extrude(amount=-CUT_EXTRUDE18_DEPTH, mode=Mode.SUBTRACT)


solid = part.part
